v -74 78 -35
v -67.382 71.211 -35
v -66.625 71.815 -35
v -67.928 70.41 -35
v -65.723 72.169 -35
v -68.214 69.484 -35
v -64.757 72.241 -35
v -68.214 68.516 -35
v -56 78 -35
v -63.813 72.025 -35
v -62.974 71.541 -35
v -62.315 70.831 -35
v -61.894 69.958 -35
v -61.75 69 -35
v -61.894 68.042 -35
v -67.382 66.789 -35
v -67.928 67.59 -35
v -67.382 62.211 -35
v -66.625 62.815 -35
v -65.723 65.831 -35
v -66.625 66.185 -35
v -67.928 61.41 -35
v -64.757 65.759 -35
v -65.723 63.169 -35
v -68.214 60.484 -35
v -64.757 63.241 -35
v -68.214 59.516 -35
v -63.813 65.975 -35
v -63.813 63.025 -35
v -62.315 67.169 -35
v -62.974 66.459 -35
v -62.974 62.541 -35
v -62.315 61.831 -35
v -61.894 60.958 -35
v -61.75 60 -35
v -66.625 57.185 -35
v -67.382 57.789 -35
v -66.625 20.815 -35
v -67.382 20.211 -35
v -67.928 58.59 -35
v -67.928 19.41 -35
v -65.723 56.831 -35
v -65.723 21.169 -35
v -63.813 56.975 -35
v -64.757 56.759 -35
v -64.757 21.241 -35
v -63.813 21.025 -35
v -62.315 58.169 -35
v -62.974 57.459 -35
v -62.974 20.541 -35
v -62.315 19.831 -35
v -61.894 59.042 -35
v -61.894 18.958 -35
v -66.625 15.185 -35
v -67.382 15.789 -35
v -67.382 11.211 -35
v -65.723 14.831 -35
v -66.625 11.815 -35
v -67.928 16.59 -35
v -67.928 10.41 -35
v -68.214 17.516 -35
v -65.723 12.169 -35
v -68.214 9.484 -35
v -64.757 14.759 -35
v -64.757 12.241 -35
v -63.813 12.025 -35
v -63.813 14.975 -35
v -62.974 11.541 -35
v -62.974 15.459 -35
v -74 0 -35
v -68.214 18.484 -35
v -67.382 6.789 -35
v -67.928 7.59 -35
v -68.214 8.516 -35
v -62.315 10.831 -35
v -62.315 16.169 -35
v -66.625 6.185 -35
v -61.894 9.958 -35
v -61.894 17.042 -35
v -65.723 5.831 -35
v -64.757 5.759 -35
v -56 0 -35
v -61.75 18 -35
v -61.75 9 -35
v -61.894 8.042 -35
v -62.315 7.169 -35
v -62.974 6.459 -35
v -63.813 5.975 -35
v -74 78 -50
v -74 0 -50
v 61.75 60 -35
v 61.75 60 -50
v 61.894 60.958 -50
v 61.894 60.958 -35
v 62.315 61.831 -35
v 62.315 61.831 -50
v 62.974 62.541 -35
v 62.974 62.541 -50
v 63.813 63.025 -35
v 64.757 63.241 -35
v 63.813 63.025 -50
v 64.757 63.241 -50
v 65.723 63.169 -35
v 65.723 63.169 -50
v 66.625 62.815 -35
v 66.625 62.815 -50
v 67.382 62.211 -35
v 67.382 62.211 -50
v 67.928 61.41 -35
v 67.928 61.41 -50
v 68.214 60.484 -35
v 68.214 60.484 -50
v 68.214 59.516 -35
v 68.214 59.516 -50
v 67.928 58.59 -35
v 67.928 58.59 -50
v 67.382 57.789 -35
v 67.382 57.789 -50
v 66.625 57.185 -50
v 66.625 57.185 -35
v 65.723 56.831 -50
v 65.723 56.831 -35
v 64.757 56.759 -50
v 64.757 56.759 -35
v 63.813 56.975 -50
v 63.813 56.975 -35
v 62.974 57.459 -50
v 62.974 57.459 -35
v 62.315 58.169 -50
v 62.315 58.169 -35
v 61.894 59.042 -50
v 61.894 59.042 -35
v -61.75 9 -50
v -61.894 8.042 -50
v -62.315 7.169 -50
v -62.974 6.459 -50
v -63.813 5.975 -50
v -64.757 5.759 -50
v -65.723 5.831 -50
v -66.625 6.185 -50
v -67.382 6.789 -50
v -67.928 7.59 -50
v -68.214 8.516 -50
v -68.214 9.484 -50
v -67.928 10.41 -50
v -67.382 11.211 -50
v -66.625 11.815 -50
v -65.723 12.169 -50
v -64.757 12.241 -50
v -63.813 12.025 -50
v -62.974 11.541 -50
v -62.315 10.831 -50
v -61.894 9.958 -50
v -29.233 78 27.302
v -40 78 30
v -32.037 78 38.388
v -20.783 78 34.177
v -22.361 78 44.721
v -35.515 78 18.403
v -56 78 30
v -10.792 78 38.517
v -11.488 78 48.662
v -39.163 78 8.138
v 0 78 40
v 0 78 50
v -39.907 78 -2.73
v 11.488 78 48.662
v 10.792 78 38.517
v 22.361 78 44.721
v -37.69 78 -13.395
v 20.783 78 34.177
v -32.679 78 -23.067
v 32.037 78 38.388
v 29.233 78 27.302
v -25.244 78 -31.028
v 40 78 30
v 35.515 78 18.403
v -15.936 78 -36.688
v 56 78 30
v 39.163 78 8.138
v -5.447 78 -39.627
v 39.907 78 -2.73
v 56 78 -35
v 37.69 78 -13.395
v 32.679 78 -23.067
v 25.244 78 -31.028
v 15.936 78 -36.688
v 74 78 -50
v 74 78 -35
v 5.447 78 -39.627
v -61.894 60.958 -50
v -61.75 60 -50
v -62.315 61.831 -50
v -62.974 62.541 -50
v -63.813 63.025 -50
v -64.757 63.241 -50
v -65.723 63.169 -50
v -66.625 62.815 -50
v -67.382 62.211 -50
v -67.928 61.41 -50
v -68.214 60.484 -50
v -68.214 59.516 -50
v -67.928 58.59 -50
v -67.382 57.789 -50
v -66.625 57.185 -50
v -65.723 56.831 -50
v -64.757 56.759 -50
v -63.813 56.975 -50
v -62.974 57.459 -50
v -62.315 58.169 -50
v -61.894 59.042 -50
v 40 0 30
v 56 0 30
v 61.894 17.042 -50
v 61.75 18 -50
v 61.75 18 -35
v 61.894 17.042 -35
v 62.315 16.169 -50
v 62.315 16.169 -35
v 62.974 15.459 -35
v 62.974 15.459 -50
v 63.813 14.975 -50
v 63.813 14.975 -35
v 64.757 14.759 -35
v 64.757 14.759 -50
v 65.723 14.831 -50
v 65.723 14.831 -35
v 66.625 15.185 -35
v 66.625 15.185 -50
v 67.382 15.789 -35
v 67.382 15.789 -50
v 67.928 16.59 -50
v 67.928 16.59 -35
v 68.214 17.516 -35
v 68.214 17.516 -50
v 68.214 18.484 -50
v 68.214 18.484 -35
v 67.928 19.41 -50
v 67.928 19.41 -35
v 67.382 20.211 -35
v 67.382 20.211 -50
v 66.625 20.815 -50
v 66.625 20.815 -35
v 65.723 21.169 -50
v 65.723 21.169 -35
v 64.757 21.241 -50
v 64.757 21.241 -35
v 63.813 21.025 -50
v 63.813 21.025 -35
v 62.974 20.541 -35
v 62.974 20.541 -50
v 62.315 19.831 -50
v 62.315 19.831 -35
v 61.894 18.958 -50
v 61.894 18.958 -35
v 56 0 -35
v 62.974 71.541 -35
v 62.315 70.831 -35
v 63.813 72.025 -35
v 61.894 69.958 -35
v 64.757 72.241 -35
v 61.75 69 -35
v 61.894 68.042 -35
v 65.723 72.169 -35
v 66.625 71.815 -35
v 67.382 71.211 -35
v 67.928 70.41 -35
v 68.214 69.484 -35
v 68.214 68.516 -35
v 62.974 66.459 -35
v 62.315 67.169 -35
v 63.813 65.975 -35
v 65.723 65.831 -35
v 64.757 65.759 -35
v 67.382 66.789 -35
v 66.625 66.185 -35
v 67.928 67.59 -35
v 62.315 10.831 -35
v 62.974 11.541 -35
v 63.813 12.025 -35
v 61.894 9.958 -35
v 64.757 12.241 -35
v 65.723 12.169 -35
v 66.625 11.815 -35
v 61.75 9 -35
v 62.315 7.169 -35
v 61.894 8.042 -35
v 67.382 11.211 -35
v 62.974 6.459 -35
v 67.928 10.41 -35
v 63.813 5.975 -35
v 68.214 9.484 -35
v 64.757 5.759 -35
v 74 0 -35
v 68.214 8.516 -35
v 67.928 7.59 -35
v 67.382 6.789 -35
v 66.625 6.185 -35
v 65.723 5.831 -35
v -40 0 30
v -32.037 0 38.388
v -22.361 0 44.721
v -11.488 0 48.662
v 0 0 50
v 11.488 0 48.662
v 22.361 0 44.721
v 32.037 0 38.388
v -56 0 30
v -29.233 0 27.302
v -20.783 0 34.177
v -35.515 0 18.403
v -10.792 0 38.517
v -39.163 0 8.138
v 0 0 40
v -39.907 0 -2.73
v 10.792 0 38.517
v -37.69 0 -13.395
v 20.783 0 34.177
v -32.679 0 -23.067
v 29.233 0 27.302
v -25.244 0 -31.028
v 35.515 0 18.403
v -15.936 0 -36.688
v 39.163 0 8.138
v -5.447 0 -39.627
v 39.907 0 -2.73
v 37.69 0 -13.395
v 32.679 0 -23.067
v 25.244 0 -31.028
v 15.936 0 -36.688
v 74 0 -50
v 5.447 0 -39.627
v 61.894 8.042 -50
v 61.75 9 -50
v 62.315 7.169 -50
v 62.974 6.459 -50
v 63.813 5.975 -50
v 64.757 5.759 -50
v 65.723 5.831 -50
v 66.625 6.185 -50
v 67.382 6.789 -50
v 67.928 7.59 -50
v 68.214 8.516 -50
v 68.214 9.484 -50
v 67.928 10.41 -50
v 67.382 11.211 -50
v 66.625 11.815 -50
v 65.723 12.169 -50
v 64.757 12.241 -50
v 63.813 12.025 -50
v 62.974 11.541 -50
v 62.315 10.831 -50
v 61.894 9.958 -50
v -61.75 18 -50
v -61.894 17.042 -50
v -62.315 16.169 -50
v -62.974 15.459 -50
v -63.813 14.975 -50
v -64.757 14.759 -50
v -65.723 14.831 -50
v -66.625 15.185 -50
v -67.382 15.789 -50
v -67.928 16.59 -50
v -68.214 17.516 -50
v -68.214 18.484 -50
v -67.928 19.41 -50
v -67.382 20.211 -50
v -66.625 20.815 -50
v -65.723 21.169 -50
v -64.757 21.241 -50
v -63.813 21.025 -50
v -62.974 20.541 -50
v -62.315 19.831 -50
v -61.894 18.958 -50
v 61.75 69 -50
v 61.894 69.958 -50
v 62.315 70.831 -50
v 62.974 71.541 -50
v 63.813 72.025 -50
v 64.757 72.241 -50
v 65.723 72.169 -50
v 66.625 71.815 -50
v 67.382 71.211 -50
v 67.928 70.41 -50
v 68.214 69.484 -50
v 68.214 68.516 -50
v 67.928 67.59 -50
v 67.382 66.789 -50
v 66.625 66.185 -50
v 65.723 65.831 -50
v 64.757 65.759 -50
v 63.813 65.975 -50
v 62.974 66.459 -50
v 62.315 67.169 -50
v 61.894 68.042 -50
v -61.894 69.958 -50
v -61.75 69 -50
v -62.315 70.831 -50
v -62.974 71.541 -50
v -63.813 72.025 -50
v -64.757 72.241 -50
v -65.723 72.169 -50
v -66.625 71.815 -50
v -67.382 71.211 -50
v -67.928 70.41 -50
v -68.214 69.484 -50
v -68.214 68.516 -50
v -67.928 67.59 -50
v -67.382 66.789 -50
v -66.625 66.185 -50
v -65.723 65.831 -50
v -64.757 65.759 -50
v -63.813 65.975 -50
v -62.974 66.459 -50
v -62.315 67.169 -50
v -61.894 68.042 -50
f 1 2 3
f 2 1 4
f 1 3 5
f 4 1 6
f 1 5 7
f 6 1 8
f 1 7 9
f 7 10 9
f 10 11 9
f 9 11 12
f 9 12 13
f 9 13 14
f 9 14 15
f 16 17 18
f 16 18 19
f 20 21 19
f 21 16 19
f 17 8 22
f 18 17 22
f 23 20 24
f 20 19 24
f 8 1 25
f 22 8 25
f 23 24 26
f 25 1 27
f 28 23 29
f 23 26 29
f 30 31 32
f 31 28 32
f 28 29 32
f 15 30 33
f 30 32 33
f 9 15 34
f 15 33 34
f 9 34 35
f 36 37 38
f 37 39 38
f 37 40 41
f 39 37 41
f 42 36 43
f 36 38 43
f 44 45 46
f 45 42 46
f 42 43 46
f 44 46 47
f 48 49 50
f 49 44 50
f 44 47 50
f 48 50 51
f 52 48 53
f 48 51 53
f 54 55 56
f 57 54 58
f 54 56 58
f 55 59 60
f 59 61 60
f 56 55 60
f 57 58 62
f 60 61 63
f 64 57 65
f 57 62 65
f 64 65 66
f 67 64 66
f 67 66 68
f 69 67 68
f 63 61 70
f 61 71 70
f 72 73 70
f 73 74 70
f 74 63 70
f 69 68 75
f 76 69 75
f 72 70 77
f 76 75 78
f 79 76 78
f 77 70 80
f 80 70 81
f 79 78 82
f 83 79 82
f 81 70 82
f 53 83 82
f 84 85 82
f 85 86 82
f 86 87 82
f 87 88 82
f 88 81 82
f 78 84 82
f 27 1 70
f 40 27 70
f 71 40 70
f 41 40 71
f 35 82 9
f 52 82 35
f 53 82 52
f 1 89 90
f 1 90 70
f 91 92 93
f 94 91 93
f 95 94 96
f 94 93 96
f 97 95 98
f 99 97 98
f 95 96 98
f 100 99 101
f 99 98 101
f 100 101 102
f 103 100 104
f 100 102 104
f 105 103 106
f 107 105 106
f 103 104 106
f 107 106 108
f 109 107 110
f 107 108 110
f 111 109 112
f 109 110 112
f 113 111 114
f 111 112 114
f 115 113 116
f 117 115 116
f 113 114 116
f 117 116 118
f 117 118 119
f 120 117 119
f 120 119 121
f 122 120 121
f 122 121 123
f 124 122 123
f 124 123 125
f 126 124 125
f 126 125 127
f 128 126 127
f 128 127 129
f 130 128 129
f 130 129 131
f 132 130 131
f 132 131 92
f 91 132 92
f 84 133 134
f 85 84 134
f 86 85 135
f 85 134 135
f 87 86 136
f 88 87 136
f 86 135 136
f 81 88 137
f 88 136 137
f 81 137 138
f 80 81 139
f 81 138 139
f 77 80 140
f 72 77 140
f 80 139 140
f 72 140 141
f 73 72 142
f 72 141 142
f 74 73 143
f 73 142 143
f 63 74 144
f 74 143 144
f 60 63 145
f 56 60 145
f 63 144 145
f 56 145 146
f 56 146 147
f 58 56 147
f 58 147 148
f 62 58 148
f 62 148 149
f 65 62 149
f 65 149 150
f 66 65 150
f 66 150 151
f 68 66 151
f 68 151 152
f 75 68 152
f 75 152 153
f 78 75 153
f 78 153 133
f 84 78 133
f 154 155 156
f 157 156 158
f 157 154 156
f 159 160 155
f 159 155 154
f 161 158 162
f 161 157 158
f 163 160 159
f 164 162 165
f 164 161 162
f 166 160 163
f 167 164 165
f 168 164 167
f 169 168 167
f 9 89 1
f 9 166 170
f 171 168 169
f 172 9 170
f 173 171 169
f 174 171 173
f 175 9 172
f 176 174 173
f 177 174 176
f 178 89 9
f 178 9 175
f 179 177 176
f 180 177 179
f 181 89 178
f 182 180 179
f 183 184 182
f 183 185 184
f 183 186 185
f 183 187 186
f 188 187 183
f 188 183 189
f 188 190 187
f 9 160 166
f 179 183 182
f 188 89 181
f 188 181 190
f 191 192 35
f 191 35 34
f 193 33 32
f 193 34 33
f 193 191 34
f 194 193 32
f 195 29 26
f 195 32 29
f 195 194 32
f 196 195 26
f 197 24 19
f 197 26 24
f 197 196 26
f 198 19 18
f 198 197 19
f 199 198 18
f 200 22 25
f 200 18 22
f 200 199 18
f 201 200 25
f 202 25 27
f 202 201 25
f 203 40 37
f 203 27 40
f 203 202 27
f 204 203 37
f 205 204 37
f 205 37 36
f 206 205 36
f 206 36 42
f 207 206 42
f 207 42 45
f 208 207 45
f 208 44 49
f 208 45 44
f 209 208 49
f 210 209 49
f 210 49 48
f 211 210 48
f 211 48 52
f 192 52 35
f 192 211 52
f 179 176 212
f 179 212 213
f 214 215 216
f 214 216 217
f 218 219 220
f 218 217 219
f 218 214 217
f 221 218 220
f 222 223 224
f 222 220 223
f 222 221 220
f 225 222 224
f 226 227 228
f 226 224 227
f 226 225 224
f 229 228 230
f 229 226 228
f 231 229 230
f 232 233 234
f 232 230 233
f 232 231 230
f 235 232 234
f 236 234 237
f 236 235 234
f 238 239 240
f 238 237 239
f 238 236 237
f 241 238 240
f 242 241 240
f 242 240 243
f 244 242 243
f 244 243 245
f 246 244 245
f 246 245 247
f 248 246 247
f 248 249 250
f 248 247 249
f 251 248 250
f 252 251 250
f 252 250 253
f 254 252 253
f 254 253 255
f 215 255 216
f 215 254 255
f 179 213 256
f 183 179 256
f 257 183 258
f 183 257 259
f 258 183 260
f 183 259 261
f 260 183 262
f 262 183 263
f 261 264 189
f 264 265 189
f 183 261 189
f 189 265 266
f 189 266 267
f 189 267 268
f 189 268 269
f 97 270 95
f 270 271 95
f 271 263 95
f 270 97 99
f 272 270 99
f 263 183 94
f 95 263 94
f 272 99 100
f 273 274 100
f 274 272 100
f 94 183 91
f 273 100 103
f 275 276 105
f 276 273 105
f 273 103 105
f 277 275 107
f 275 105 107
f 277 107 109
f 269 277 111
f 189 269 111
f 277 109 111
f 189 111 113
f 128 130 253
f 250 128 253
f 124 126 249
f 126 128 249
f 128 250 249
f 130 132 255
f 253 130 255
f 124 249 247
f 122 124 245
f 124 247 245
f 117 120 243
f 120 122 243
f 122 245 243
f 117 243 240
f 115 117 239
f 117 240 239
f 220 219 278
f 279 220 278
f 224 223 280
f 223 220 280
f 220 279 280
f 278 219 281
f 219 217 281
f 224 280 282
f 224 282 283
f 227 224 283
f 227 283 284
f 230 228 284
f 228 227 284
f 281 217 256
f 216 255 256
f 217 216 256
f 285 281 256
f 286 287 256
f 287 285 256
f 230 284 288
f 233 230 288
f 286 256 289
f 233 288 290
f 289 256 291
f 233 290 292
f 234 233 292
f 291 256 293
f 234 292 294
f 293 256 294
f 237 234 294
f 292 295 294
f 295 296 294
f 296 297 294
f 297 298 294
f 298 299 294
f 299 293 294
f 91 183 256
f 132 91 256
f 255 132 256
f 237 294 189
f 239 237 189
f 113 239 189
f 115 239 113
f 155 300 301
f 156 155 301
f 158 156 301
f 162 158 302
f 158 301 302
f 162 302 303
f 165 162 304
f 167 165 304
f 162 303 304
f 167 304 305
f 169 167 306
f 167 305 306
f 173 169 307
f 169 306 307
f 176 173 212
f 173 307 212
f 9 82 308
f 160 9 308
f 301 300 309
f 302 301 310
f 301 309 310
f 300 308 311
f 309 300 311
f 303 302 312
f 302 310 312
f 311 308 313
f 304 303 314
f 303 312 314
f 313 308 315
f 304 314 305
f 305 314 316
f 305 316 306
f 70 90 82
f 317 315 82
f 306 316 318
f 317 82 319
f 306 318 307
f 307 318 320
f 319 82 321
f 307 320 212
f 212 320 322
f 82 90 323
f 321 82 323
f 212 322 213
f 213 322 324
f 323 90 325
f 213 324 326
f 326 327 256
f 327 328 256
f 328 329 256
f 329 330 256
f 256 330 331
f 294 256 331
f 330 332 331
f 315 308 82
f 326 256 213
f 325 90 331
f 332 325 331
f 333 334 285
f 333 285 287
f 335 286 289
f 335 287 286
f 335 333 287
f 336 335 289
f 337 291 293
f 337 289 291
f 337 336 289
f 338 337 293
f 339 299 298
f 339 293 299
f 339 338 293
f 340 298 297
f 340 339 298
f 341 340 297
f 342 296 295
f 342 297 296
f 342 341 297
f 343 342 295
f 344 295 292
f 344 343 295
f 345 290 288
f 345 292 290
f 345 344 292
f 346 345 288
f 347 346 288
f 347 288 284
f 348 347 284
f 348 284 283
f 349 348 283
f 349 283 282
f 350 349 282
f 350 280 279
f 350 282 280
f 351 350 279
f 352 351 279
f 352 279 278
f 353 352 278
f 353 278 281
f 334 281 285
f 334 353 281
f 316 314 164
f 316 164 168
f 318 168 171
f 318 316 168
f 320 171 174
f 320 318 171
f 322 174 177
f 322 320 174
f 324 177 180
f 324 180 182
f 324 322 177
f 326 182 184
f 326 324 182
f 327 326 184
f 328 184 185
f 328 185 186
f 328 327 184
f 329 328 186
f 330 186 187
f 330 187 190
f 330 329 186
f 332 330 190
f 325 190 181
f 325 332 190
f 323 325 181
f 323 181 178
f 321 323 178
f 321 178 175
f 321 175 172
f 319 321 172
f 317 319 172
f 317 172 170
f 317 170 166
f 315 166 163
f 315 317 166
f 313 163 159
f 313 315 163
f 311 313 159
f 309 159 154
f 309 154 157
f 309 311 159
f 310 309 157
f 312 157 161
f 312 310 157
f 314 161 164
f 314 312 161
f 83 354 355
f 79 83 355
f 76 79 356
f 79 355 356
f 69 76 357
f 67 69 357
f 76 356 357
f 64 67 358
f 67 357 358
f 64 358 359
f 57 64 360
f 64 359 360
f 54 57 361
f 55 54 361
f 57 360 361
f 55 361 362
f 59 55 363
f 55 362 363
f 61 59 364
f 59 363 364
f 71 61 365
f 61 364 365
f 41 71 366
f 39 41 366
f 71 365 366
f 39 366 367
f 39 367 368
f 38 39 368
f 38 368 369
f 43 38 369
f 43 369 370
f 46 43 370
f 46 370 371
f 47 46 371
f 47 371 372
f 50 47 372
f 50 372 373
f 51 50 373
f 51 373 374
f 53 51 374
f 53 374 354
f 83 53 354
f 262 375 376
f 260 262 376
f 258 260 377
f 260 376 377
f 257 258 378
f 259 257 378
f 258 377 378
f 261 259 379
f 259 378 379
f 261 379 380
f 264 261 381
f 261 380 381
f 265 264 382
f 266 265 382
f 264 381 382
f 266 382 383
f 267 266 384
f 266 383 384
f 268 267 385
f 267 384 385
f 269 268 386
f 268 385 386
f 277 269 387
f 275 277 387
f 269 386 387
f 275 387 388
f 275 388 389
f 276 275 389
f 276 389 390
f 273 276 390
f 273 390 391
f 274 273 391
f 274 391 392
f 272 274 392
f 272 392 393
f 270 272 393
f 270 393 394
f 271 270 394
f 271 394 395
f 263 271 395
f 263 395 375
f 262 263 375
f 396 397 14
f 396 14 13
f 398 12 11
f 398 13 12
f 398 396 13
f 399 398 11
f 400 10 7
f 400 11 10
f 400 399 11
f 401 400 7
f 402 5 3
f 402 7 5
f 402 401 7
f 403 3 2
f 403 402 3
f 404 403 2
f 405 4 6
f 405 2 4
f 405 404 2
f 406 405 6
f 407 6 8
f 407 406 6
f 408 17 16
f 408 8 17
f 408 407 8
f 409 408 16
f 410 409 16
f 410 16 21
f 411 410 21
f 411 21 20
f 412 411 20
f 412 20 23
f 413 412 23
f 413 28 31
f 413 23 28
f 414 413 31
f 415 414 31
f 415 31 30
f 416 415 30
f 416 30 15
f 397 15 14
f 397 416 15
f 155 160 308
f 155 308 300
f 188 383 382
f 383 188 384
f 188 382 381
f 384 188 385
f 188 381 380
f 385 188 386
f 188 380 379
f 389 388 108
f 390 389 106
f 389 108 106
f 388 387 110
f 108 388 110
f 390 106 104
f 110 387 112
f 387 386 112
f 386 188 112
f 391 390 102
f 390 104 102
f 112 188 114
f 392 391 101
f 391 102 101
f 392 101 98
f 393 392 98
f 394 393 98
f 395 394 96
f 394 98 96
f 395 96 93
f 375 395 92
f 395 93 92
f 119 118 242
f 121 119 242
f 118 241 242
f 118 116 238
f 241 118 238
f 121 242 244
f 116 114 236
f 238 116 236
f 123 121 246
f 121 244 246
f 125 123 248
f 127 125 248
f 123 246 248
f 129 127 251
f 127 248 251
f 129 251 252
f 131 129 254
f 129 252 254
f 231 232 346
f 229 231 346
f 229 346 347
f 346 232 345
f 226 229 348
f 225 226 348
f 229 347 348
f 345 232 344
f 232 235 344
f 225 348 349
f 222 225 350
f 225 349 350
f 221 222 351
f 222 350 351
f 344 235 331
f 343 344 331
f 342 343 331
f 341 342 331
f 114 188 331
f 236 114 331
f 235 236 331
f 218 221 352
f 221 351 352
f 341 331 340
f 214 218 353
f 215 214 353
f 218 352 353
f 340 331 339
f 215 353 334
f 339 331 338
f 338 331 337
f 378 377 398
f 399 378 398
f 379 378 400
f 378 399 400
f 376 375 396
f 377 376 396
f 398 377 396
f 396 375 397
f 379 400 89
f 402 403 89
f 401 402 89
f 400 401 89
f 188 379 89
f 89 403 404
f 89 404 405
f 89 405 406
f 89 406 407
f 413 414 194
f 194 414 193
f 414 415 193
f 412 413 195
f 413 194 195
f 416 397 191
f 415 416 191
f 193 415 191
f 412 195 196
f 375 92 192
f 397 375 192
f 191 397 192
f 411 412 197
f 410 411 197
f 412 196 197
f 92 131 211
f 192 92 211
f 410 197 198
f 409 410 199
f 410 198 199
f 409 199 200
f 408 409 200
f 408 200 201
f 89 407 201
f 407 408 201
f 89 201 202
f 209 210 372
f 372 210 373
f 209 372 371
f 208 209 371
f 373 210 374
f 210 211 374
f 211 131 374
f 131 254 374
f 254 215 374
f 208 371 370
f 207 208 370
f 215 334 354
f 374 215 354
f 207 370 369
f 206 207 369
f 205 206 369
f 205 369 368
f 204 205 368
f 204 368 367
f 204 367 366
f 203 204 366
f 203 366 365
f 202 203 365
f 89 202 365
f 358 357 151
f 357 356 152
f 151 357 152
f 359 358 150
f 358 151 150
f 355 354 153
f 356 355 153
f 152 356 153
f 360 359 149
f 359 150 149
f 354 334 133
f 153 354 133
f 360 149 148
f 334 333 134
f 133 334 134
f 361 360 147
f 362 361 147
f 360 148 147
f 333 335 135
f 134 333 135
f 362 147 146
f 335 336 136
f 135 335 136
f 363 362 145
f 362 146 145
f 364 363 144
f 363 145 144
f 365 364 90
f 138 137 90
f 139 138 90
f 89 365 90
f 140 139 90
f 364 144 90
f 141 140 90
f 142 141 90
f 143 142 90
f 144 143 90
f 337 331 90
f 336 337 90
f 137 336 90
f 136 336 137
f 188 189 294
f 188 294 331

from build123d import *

# Parameters (mm, degrees)
SKETCH1_R                            = 40
BOSS_EXTRUDE1_DEPTH                  = 78
F_6_5_6_5_DIAMETER_HOLE1_D           = 6.5
MIRROR2_AT_THE_SECOND_PLANE_COPY_1_D = 6.5


with BuildPart() as part:
    # Sketch1 → Boss-Extrude1 (new body)
    with BuildSketch(Plane(origin=(0, 0, 0), x_dir=(1, 0, 0), z_dir=(0, 1, 0))):
        with BuildLine():
            Line((-74, 50), (-74, 35))
            Line((-74, 35), (-56, 35))
            Line((-56, 35), (-56, -30))
            Line((-56, -30), (-40, -30))
            ThreePointArc((-40, -30), (0, -50), (40, -30))
            Line((40, -30), (56, -30))
            Line((56, -30), (56, 35))
            Line((56, 35), (74, 35))
            Line((74, 35), (74, 50))
            Line((74, 50), (-74, 50))
        make_face()
        with Locations(Location((0, 0, 0), (0, 0, 270))):
            Circle(SKETCH1_R, mode=Mode.SUBTRACT)
    extrude(amount=BOSS_EXTRUDE1_DEPTH)

    # Ø6.5 (6.5) Diameter Hole1 (through all)
    with Locations(Plane(origin=(65, 69, -35), x_dir=(1, 0, 0), z_dir=(0, 0, 1))):
        with Locations((0, 0), (0, -9)):
            f_6_5_6_5_diameter_hole1 = Hole(F_6_5_6_5_DIAMETER_HOLE1_D / 2)

    # Mirror2: Ø6.5 (6.5) Diameter Hole1 across plane
    add(f_6_5_6_5_diameter_hole1.mirror(Plane.ZX.offset(39)), mode=Mode.SUBTRACT)

    # Mirror2 at the second plane: Ø6.5 (6.5) Diameter Hole1 across plane
    add(f_6_5_6_5_diameter_hole1.mirror(Plane(origin=(0, 0, 0), x_dir=(0, 0, 1), z_dir=(1, 0, 0))), mode=Mode.SUBTRACT)

    # Mirror2 at the second plane copy 1 (through all)
    with Locations(Plane(origin=(-65, 9, -35), x_dir=(-1, 0, 0), z_dir=(0, 0, 1))):
        with Locations((0, 0), (0, -9)):
            Hole(MIRROR2_AT_THE_SECOND_PLANE_COPY_1_D / 2)


solid = part.part
